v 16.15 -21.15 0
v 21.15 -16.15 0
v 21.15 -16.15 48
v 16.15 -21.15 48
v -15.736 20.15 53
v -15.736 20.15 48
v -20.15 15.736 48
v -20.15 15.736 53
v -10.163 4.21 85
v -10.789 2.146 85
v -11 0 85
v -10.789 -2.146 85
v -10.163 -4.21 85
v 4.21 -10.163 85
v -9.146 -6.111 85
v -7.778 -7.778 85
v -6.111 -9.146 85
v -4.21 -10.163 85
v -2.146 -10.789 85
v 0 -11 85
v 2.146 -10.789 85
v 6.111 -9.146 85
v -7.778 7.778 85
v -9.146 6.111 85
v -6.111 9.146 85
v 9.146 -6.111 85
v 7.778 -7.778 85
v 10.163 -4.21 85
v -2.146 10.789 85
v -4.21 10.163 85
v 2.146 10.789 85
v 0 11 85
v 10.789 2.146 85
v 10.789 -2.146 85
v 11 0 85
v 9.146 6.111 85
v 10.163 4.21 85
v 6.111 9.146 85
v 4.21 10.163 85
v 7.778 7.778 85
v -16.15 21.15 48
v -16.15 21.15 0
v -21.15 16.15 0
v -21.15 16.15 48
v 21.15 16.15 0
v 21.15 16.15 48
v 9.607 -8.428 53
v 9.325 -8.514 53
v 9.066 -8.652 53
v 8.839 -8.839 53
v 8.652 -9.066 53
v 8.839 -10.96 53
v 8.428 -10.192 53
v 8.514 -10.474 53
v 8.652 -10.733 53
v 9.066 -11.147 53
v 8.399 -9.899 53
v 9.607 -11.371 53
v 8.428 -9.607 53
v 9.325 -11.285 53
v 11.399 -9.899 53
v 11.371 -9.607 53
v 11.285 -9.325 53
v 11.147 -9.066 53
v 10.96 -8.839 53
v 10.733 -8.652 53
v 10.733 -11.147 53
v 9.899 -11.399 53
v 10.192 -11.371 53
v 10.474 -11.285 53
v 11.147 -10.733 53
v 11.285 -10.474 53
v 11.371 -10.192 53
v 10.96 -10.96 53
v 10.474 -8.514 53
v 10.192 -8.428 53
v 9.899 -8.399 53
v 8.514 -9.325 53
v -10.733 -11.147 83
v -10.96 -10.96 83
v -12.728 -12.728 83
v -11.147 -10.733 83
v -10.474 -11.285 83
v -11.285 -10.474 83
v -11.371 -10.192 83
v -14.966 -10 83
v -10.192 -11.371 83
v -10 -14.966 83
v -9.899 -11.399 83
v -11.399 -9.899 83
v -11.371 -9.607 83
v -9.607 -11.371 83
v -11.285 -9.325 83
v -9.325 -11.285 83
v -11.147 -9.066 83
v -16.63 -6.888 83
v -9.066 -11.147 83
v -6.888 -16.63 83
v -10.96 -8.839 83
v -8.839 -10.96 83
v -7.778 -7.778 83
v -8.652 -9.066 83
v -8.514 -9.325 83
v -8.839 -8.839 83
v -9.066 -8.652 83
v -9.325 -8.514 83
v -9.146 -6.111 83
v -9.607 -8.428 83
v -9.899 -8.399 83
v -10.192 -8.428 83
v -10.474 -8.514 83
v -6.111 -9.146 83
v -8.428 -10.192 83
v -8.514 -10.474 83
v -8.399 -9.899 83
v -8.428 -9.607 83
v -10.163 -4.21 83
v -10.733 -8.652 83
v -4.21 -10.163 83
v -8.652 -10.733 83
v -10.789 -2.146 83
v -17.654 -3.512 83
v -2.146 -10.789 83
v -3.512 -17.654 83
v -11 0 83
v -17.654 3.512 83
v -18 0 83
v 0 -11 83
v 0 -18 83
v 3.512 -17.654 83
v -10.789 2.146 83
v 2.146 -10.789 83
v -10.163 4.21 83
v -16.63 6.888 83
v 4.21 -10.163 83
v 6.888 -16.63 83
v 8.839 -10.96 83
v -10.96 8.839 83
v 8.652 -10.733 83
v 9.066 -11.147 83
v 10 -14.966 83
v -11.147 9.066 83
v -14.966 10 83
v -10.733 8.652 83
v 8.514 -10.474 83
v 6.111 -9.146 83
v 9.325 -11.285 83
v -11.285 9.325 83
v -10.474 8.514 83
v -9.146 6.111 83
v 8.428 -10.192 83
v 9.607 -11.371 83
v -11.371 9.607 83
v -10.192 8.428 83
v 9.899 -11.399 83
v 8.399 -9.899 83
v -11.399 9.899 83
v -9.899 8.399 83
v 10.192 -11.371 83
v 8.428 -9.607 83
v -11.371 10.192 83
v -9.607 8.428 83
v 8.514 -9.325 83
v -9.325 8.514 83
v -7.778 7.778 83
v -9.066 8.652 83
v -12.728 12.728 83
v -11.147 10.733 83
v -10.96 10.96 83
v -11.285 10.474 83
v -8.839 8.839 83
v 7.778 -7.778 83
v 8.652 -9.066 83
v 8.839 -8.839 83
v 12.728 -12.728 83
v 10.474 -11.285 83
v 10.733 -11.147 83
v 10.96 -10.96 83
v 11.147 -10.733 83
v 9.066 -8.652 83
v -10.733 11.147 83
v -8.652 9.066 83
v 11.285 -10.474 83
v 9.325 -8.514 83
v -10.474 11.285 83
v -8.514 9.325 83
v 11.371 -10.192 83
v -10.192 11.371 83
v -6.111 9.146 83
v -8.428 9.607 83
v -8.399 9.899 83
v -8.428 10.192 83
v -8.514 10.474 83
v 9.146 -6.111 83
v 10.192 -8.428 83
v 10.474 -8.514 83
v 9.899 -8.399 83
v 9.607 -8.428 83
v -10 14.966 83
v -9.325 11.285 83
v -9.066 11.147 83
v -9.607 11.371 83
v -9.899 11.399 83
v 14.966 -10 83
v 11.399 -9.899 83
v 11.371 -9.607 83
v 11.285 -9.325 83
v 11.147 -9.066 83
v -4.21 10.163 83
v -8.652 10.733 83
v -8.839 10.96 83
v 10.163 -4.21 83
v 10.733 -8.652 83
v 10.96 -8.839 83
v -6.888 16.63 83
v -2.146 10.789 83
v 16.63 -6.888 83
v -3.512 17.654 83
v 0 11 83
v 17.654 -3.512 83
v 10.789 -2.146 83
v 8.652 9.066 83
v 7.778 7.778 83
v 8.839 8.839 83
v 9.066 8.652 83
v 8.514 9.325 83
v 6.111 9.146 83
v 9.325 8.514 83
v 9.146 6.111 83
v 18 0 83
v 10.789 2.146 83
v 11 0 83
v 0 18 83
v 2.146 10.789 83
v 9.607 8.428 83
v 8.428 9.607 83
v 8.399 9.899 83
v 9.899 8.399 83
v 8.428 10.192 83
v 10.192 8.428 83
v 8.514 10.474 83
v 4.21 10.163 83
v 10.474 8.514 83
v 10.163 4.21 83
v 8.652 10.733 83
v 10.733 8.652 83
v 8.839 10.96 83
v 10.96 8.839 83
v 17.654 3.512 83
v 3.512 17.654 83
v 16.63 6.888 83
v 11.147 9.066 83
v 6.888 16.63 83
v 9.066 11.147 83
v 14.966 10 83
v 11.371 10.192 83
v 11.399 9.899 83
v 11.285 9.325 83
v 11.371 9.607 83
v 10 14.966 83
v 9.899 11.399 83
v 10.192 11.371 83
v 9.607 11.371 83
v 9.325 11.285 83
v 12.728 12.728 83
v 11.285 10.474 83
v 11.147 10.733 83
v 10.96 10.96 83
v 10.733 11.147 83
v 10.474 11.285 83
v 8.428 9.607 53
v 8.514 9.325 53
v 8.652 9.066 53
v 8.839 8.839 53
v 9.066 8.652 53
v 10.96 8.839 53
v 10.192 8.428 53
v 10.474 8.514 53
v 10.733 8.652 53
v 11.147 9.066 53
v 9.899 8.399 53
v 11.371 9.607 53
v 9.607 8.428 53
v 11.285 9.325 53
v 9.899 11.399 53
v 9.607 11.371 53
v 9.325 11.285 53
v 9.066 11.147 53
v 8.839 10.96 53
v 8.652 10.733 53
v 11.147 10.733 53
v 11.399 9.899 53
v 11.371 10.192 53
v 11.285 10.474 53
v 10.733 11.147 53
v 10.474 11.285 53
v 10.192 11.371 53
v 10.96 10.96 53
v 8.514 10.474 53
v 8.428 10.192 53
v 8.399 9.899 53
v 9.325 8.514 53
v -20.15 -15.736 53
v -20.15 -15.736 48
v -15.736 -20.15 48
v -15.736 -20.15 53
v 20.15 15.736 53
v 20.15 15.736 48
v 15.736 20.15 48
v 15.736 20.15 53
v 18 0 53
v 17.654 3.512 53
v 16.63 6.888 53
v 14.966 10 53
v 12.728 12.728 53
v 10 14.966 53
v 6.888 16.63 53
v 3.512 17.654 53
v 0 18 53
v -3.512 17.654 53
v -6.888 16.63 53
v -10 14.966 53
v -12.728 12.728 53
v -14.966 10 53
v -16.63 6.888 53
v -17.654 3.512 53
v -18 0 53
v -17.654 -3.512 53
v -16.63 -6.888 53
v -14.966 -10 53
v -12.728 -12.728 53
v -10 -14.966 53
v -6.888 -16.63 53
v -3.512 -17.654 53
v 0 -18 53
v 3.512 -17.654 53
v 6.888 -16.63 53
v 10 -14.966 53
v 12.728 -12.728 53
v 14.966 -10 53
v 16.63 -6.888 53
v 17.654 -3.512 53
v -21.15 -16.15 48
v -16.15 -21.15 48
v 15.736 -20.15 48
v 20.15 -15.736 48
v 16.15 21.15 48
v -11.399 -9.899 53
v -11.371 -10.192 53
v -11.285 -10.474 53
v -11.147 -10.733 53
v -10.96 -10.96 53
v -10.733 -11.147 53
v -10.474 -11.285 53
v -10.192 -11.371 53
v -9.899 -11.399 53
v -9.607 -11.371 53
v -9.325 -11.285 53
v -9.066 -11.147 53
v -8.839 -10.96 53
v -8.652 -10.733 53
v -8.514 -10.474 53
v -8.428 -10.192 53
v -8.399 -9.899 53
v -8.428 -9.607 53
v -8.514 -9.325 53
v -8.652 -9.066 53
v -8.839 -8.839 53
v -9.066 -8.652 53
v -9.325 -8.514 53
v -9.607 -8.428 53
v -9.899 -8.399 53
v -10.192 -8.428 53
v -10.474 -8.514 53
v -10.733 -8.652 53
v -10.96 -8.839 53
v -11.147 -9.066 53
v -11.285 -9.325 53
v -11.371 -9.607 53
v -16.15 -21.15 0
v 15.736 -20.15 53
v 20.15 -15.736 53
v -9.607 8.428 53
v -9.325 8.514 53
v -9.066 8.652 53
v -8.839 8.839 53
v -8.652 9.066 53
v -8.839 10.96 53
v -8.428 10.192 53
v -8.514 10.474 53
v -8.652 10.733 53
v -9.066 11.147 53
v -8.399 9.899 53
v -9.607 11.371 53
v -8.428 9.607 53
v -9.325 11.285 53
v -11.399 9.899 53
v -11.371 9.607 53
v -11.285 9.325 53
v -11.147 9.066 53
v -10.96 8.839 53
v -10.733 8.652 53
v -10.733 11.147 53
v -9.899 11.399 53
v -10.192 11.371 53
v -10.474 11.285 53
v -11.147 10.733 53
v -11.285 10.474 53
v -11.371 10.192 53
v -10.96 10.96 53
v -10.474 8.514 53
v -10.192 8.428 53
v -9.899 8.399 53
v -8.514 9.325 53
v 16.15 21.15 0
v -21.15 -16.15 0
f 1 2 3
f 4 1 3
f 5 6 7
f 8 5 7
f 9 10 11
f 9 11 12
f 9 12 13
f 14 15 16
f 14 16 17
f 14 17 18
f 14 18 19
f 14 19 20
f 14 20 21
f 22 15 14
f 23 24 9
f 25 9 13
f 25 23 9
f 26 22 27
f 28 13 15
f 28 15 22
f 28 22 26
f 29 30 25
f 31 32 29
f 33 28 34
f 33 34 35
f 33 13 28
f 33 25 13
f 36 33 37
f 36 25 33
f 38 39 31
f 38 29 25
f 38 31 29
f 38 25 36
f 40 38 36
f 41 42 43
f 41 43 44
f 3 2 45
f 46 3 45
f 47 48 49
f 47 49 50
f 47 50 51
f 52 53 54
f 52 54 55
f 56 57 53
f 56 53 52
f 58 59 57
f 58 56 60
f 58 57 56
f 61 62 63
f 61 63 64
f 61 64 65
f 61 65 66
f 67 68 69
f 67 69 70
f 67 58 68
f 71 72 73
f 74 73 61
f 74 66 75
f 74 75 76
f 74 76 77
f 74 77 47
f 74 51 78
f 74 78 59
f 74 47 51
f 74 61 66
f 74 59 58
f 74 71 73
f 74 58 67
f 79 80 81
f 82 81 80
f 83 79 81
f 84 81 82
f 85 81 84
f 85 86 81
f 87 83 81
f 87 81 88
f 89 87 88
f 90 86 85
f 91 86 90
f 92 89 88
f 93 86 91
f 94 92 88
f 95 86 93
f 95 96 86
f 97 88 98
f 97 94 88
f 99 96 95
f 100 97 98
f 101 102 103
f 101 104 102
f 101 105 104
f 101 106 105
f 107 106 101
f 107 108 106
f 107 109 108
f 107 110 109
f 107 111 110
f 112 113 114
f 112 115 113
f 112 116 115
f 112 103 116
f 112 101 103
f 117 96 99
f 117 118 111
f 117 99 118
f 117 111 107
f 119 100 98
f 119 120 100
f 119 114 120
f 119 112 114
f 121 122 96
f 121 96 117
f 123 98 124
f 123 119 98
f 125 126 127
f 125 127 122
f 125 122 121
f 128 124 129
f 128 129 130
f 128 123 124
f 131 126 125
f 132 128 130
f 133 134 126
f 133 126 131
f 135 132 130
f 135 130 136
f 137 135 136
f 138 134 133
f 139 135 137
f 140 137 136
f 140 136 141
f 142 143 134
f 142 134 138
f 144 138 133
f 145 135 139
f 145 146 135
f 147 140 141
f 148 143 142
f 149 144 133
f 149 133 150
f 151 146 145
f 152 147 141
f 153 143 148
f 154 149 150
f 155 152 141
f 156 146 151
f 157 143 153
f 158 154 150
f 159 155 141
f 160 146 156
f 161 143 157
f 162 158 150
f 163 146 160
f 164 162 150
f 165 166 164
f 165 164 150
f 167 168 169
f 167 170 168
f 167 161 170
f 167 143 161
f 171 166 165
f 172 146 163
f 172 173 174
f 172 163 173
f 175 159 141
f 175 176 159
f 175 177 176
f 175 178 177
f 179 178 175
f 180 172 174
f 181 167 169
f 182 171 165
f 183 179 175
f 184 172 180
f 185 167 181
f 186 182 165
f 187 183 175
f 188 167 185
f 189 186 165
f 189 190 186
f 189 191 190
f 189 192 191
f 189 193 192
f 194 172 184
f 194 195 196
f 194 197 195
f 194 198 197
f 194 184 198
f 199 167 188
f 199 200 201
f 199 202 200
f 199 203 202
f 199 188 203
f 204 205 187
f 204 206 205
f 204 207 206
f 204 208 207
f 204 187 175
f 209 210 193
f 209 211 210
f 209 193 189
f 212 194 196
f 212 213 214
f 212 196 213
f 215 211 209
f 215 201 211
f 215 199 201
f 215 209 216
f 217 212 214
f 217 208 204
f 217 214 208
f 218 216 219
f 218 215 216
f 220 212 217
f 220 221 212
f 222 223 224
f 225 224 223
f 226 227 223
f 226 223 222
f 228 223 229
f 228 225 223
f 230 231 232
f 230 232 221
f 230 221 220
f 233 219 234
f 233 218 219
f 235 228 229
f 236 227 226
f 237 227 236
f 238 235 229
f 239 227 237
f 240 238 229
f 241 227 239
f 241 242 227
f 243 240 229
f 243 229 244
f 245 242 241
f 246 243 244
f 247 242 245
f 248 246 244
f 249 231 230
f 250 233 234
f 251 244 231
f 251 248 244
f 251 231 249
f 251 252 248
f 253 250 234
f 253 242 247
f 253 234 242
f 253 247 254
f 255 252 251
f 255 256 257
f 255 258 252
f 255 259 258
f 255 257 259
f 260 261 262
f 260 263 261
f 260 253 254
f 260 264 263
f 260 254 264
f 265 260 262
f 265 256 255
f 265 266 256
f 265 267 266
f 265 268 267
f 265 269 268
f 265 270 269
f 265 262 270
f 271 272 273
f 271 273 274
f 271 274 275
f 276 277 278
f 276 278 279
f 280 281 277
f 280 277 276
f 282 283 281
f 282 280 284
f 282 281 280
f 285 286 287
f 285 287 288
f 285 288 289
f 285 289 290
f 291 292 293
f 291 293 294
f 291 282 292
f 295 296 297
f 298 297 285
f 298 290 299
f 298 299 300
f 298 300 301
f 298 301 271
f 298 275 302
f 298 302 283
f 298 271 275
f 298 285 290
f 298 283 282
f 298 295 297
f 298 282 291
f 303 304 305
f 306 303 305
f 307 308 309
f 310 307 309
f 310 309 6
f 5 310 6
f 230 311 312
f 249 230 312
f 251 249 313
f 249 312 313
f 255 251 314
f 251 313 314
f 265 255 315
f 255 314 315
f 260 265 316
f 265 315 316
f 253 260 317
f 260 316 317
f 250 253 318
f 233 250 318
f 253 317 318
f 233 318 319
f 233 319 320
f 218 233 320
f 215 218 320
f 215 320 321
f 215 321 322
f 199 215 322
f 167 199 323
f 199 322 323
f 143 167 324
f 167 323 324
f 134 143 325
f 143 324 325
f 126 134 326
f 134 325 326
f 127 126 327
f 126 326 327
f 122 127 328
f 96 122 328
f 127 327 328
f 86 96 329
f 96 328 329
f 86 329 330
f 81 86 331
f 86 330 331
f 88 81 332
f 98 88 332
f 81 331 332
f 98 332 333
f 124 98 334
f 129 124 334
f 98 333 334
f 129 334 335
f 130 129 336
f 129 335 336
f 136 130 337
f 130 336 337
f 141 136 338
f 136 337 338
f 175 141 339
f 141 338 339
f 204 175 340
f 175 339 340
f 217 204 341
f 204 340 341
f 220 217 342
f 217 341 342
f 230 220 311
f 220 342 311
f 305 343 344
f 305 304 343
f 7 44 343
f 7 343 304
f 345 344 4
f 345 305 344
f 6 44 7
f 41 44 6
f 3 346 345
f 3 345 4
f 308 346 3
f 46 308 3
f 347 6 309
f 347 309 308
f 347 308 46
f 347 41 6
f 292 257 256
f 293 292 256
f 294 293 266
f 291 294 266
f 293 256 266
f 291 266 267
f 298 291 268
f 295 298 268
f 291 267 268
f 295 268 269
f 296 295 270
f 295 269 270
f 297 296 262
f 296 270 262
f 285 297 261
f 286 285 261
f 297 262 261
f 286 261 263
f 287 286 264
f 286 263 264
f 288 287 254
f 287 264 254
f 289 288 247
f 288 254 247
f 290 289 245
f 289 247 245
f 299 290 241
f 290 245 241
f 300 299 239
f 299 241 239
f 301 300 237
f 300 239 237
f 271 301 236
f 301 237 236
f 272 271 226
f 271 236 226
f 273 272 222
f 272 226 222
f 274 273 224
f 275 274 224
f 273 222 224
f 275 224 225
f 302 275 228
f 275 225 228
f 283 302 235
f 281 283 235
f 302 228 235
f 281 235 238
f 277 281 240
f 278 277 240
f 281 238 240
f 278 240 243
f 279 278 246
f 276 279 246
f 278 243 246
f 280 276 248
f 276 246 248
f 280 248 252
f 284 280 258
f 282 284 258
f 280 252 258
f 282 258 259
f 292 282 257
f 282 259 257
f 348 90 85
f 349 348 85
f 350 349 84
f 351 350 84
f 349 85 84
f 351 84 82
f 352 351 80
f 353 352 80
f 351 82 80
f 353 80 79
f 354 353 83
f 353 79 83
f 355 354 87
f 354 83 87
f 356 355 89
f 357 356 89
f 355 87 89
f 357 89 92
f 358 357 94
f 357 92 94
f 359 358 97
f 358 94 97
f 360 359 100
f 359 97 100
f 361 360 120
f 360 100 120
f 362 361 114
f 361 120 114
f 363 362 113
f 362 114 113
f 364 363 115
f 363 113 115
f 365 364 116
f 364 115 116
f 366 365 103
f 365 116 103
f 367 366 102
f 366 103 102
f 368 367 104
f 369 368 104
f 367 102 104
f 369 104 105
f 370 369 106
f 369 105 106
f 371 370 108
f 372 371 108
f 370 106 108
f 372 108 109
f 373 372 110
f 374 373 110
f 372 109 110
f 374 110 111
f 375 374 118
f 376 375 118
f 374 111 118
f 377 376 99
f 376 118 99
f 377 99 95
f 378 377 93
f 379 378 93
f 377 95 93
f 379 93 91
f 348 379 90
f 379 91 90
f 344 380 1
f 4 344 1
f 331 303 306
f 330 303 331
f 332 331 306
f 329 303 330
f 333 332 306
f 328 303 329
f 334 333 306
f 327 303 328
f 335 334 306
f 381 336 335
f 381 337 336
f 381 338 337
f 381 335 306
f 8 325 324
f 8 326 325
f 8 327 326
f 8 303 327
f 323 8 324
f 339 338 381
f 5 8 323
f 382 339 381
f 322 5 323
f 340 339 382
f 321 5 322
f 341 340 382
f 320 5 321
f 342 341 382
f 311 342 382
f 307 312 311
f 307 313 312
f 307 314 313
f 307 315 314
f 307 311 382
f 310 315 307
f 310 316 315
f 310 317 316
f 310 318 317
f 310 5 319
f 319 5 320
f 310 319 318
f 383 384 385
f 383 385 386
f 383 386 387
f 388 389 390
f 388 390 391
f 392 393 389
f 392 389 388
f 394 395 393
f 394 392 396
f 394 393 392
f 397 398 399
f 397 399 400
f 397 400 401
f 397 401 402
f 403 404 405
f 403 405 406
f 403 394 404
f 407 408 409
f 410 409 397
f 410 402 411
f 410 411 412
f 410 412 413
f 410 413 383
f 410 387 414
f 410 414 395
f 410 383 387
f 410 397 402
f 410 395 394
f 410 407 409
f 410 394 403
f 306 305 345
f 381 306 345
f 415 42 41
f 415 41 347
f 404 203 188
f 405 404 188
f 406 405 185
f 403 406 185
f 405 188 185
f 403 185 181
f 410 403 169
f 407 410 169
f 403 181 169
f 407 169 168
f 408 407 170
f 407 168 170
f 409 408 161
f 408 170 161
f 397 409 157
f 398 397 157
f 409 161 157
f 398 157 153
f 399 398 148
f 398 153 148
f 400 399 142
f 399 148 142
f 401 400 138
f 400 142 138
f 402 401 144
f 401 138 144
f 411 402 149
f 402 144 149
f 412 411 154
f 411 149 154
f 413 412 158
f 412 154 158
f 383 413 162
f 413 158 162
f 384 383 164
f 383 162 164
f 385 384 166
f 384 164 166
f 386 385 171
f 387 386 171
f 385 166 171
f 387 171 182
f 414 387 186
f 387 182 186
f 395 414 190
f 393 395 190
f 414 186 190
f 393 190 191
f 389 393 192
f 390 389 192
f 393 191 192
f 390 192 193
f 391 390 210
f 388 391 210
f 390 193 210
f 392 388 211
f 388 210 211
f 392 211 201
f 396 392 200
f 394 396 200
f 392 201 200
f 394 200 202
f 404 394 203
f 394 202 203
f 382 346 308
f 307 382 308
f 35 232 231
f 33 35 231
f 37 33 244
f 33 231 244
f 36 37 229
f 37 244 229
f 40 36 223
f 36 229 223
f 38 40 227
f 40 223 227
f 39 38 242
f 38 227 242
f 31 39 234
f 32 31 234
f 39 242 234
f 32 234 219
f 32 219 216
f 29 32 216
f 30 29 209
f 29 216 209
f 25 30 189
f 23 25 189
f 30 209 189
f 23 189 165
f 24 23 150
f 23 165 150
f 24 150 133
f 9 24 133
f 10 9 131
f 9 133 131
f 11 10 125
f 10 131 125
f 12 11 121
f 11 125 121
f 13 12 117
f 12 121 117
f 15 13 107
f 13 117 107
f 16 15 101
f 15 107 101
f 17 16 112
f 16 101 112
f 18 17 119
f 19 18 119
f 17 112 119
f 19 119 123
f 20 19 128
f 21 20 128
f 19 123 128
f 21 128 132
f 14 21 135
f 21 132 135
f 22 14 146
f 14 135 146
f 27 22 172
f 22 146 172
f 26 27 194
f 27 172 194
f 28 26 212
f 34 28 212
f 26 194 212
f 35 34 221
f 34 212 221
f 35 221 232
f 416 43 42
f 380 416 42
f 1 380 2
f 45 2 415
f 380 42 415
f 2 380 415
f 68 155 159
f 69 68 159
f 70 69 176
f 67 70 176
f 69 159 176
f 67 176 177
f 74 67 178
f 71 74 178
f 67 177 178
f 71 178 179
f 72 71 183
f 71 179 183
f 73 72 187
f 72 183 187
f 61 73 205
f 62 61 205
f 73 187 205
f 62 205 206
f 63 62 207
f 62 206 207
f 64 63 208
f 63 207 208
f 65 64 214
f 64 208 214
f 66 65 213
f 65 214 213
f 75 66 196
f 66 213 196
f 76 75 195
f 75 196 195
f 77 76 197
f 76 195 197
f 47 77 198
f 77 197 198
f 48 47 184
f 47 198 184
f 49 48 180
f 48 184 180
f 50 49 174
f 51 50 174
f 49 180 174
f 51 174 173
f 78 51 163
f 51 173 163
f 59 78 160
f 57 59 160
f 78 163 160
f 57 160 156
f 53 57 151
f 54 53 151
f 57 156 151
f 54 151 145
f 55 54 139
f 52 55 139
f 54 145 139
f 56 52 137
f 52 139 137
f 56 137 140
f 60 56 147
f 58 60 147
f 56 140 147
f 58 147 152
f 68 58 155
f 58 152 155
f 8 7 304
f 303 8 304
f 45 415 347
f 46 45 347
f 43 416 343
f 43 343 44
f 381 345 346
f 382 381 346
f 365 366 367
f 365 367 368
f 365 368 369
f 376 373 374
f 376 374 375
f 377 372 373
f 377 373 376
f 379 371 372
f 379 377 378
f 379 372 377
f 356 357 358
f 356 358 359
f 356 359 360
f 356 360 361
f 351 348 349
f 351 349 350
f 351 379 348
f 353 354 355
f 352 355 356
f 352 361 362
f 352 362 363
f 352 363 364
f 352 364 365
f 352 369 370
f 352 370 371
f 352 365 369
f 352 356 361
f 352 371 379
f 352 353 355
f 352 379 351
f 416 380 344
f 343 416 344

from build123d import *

# Parameters (mm, degrees)
SCHIZZO1_W                   = 42.3
SCHIZZO1_H                   = 42.3
ESTRUSIONE_ESTRUSIONE1_DEPTH = 48
SMUSSO1_SIZE                 = 5
ESTRUSIONE_ESTRUSIONE2_DEPTH = 5
SCHIZZO3_R                   = 18
ESTRUSIONE_ESTRUSIONE3_DEPTH = 30
SCHIZZO4_R                   = 11
ESTRUSIONE_ESTRUSIONE4_DEPTH = 2
SCHIZZO7_R                   = 1.5
TAGLIO_ESTRUSIONE2_DEPTH     = 30
RIPETIZIONECIRCOLARE1_COUNT  = 4


with BuildPart() as part:
    # Schizzo1 → Estrusione-Estrusione1 (new body)
    with BuildSketch(Plane.XY):
        Rectangle(SCHIZZO1_W, SCHIZZO1_H)
    extrude(amount=ESTRUSIONE_ESTRUSIONE1_DEPTH)

    # Smusso1
    smusso1_edges = [part.edges().sort_by_distance(p)[0] for p in [
        (-21.15, 21.15, 24),
        (21.15, 21.15, 24),
        (21.15, -21.15, 24),
        (-21.15, -21.15, 24),
    ]]
    chamfer(smusso1_edges, length=SMUSSO1_SIZE)

    # Schizzo2 → Estrusione-Estrusione2 (add)
    with BuildSketch(Plane.XY.offset(48)):
        Polygon((-20.15, 15.735786438), (-20.15, -15.735786438), (-15.735786438, -20.15), (15.735786438, -20.15), (20.15, -15.735786438), (20.15, 15.735786438), (15.735786438, 20.15), (-15.735786438, 20.15), align=None)
    extrude(amount=ESTRUSIONE_ESTRUSIONE2_DEPTH)

    # Schizzo3 → Estrusione-Estrusione3 (add)
    with BuildSketch(Plane.XY.offset(53)):
        Circle(SCHIZZO3_R)
    extrude(amount=ESTRUSIONE_ESTRUSIONE3_DEPTH)

    # Schizzo4 → Estrusione-Estrusione4 (add)
    with BuildSketch(Plane.XY.offset(83)):
        Circle(SCHIZZO4_R)
    extrude(amount=ESTRUSIONE_ESTRUSIONE4_DEPTH)

    # Schizzo7 → Taglio-Estrusione2 (cut)
    with BuildSketch(Plane.XY.offset(83)):
        with Locations((9.899494937, 9.899494937)):
            Circle(SCHIZZO7_R)
    taglio_estrusione2 = extrude(amount=-TAGLIO_ESTRUSIONE2_DEPTH, mode=Mode.SUBTRACT)

    # RipetizioneCircolare1: Taglio-Estrusione2 ×4 about axis
    ripetizionecircolare1_axis = Axis((0, 0, 0), (0, 0, 1))
    for i in range(1, RIPETIZIONECIRCOLARE1_COUNT):
        add(taglio_estrusione2.rotate(ripetizionecircolare1_axis, i * 360 / RIPETIZIONECIRCOLARE1_COUNT), mode=Mode.SUBTRACT)


solid = part.part
